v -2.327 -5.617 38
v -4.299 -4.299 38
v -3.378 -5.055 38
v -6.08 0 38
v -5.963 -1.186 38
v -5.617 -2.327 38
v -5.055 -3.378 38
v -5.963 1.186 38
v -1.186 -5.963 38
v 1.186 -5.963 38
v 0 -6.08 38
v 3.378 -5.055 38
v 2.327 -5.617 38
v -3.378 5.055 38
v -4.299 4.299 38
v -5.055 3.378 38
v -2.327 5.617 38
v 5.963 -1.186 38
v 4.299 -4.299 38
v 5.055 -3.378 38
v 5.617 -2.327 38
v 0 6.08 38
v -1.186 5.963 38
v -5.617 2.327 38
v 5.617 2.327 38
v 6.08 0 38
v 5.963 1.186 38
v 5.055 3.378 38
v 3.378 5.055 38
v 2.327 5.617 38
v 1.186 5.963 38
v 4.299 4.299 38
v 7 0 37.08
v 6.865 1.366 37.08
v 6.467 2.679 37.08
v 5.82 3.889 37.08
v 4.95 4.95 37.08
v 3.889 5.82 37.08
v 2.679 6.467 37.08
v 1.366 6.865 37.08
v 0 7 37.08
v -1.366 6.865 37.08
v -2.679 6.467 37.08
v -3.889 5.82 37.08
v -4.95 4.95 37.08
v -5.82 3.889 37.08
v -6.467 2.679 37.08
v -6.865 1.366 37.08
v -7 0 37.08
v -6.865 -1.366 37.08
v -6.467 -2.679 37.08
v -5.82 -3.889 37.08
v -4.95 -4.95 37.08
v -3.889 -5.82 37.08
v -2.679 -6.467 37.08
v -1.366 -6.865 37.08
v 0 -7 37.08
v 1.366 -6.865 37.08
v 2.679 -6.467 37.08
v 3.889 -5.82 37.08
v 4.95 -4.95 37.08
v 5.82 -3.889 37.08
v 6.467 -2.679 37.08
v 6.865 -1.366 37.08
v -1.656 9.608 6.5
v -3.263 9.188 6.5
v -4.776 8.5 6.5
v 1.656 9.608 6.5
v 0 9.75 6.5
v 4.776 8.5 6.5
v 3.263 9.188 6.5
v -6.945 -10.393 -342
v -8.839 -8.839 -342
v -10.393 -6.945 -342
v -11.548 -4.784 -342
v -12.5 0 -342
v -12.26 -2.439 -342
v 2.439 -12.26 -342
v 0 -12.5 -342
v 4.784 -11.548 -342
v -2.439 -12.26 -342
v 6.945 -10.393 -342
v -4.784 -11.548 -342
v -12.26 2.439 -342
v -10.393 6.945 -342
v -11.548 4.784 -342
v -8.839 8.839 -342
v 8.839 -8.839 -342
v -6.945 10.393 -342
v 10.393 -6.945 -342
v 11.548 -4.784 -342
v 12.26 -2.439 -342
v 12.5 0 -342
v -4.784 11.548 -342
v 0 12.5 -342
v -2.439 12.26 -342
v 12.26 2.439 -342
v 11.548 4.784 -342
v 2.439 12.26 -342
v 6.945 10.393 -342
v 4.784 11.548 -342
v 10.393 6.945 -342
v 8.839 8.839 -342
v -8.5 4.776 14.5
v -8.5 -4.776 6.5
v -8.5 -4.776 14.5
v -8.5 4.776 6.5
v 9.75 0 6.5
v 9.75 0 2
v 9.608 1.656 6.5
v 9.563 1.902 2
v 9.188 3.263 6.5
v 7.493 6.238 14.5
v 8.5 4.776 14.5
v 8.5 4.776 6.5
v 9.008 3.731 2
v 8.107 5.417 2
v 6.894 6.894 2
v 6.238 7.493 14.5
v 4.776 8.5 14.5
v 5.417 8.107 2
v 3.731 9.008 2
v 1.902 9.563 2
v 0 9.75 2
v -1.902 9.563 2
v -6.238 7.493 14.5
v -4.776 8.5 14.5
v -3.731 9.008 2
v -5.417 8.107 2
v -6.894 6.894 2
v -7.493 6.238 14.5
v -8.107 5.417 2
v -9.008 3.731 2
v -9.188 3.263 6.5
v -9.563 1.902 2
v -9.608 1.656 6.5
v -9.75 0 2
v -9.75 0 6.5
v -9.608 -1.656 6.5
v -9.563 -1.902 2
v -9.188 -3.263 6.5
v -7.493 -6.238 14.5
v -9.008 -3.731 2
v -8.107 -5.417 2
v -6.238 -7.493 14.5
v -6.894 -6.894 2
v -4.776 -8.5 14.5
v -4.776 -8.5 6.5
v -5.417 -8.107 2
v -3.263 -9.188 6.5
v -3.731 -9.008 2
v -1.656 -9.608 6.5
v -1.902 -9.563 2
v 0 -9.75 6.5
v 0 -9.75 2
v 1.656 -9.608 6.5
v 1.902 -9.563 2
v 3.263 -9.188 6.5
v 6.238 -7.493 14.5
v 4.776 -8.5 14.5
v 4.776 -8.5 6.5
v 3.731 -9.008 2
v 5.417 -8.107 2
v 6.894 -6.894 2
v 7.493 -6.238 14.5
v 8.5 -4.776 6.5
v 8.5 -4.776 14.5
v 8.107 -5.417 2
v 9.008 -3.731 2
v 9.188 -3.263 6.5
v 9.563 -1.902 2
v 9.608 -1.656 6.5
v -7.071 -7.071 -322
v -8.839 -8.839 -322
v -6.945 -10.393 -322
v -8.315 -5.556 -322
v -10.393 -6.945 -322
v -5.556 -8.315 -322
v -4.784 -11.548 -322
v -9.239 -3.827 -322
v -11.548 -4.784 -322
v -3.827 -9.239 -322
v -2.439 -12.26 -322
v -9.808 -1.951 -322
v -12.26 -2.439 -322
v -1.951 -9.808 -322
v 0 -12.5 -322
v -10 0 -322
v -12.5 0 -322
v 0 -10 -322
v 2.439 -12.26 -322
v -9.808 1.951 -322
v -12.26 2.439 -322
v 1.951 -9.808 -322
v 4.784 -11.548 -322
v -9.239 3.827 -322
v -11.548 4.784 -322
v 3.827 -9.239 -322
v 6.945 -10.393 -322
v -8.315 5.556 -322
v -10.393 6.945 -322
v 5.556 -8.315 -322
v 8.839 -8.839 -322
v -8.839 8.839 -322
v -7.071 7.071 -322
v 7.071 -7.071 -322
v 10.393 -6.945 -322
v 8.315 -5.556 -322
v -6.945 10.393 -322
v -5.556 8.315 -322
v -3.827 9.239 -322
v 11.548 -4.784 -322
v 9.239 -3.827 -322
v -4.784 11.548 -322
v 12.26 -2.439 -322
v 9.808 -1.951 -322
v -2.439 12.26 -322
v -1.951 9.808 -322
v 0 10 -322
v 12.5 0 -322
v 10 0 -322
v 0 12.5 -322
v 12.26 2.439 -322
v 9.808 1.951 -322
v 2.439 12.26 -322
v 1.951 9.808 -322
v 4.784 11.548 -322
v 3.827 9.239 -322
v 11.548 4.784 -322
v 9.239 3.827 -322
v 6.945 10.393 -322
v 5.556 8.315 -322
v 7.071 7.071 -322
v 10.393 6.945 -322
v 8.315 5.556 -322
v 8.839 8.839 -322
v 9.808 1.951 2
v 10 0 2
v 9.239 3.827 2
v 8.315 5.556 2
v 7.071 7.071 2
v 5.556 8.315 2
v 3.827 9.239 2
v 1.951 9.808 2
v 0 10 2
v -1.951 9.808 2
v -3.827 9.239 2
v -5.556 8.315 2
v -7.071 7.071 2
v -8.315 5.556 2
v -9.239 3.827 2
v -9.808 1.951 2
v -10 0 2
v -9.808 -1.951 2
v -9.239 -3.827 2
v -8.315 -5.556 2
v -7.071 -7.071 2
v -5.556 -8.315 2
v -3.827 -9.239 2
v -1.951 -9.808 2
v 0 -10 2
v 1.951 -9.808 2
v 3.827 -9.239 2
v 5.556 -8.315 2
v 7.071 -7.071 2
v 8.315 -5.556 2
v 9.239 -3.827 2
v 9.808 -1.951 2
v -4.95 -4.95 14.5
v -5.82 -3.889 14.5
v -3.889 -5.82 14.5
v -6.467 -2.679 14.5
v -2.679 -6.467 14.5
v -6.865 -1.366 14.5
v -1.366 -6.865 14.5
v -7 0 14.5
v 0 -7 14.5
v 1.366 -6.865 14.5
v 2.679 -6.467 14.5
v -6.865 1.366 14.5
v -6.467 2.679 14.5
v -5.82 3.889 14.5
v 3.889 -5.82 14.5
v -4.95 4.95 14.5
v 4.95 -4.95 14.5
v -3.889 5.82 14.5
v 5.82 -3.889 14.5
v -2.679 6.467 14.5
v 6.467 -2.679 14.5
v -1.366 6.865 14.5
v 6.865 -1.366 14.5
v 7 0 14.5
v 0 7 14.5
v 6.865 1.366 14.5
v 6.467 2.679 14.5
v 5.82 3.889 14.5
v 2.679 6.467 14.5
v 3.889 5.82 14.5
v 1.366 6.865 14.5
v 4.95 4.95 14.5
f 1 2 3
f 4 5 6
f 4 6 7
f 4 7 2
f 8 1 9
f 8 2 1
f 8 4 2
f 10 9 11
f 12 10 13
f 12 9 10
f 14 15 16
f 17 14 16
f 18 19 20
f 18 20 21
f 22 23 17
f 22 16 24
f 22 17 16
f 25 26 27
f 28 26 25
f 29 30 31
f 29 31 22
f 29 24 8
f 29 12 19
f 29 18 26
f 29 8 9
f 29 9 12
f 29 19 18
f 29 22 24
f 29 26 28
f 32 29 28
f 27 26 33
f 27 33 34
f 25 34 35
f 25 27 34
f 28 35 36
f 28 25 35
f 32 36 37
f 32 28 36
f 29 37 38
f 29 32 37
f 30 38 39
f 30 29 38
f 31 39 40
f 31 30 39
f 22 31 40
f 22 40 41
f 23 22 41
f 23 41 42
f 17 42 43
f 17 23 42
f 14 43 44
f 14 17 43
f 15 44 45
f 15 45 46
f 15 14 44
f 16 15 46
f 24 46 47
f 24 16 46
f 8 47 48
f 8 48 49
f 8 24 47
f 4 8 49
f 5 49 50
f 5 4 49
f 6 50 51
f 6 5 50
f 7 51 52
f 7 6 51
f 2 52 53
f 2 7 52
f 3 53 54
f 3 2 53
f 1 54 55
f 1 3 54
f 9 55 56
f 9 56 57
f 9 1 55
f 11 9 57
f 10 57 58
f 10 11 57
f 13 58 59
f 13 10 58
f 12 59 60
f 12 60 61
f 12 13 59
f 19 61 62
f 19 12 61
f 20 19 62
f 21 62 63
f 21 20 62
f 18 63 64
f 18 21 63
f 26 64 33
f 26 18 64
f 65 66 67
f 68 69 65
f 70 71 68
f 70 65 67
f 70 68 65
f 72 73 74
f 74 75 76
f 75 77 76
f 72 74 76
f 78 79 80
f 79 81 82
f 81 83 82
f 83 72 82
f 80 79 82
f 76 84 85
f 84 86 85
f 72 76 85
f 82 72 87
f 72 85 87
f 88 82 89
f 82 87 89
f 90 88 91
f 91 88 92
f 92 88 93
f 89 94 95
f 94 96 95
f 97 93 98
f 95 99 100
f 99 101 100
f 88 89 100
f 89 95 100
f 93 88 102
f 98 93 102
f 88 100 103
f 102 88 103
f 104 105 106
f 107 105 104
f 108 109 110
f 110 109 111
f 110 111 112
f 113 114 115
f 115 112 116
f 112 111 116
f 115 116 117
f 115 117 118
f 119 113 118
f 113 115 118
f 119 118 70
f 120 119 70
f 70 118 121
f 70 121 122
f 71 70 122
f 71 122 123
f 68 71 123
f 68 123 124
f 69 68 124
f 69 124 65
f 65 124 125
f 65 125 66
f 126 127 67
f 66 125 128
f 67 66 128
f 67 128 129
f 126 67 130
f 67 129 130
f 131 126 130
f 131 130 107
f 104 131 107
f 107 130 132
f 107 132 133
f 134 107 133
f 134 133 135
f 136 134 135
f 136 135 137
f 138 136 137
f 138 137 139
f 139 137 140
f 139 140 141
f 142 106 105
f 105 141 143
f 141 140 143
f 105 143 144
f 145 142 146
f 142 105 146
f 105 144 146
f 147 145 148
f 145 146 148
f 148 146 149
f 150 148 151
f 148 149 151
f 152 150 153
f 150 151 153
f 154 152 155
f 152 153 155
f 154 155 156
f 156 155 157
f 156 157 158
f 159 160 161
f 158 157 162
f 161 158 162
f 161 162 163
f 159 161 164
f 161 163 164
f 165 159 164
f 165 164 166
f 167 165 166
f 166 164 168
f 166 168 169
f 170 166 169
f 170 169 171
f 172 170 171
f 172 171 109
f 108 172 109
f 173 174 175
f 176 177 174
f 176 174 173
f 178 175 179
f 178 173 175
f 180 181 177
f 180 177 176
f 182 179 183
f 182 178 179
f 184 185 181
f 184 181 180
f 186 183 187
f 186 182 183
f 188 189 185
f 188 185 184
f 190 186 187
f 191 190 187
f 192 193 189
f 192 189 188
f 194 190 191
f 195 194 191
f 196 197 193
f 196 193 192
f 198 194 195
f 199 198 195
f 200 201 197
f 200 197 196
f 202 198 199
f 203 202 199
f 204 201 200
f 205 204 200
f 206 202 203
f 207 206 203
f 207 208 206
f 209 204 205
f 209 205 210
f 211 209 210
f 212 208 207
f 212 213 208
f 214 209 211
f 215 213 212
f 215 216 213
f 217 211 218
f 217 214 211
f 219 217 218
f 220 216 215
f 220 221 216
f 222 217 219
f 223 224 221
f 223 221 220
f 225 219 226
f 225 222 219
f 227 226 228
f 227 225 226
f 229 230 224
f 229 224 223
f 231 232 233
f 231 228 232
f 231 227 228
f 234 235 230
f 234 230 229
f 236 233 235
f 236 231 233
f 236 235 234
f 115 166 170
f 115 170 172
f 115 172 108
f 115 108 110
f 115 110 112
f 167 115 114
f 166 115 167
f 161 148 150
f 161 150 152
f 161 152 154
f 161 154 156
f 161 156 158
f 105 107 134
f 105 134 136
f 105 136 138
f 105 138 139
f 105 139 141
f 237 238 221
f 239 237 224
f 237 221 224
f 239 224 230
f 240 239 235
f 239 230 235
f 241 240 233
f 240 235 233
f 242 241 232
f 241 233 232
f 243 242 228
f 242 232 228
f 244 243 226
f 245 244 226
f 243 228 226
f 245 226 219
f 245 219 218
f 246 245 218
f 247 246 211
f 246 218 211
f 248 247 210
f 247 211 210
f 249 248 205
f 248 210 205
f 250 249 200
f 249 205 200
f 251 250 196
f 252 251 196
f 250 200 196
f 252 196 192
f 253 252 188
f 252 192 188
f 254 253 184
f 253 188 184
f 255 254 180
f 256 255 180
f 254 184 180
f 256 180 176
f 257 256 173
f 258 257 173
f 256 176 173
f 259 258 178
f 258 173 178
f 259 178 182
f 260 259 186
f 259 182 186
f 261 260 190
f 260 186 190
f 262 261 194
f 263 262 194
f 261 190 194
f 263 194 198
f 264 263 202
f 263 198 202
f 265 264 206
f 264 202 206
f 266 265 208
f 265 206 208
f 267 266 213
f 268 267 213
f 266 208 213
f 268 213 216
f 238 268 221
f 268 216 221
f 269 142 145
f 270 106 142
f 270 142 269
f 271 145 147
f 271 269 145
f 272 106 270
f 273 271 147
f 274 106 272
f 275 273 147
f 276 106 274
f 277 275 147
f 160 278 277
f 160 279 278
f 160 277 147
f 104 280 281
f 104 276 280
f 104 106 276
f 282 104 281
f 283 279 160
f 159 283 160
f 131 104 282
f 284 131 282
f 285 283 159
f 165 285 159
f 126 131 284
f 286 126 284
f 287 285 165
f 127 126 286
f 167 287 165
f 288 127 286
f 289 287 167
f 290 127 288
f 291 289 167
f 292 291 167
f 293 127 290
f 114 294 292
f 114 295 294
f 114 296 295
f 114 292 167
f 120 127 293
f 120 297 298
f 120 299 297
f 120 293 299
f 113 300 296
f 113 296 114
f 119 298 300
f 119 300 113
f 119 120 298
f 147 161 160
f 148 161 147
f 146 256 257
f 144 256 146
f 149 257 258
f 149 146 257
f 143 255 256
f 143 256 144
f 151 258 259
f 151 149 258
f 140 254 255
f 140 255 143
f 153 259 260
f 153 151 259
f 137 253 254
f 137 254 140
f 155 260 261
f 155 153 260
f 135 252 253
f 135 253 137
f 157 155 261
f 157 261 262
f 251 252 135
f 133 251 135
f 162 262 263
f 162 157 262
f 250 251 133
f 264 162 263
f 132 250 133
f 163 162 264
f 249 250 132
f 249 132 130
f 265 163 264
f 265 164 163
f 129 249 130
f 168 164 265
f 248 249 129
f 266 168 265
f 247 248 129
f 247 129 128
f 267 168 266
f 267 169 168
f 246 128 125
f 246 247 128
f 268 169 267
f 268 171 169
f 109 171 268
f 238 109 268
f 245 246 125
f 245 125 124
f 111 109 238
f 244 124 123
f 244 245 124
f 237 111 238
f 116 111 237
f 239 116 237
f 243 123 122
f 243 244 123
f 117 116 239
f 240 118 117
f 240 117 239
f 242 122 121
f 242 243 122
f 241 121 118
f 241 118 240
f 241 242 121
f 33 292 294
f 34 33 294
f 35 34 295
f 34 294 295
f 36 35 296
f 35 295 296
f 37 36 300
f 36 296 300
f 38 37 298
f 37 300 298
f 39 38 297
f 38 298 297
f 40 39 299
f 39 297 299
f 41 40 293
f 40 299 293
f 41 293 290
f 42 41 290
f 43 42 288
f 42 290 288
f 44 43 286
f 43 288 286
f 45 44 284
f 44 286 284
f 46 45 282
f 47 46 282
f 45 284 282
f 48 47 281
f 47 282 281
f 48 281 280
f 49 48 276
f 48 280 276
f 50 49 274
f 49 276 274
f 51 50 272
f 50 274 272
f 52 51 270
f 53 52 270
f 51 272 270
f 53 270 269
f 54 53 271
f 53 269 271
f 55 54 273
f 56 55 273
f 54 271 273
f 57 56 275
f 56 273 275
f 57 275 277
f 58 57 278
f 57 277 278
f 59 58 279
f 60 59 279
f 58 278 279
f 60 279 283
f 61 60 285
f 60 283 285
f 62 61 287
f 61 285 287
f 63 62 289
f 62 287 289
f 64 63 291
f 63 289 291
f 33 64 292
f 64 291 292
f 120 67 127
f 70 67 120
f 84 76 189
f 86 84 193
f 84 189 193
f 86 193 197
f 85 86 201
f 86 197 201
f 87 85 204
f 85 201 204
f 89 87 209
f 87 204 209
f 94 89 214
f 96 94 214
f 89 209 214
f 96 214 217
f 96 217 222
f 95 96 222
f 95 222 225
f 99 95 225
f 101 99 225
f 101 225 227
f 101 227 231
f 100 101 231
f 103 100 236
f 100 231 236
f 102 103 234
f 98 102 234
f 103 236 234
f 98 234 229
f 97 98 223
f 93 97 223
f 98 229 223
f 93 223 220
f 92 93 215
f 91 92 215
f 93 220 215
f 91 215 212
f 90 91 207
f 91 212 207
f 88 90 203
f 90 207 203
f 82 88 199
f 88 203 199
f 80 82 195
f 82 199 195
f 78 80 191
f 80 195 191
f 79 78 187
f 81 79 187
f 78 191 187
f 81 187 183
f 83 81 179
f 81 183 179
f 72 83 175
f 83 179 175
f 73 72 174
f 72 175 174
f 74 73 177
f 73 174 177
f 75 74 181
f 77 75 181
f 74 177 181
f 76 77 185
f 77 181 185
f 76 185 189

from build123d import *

# Parameters (mm, degrees)
SKETCH1_W           = 12.5
SKETCH1_H           = 20
SKETCH2_R           = 10
BOSS_EXTRUDE1_DEPTH = 324
SKETCH3_R           = 9.75
BOSS_EXTRUDE2_DEPTH = 12.5
CUT_EXTRUDE1_START  = -8
CUT_EXTRUDE1_DEPTH  = 8
CUT_EXTRUDE2_START  = -8
CUT_EXTRUDE2_DEPTH  = 8
CUT_EXTRUDE3_START  = -8
CUT_EXTRUDE3_DEPTH  = 8
CUT_EXTRUDE4_START  = -8
CUT_EXTRUDE4_DEPTH  = 8
SKETCH8_R           = 7
BOSS_EXTRUDE3_DEPTH = 23.5
CHAMFER1_SIZE       = 0.92


with BuildPart() as part:
    # Sketch1 → Revolve1 (revolve)
    with BuildSketch(Plane.XZ, mode=Mode.PRIVATE) as revolve1_sk:
        with Locations((6.25, -332)):
            Rectangle(SKETCH1_W, SKETCH1_H)
    revolve(revolve1_sk.sketch.rotate(Axis((0, 0, -322), (0, 0, -1)), 180), axis=Axis((0, 0, -322), (0, 0, -1)))

    # Sketch2 → Boss-Extrude1 (add)
    with BuildSketch(Plane.XY.offset(-322)):
        Circle(SKETCH2_R)
    extrude(amount=BOSS_EXTRUDE1_DEPTH)

    # Sketch3 → Boss-Extrude2 (add)
    with BuildSketch(Plane.XY.offset(2)):
        Circle(SKETCH3_R)
    extrude(amount=BOSS_EXTRUDE2_DEPTH)

    # Sketch4 → Cut-Extrude1 (cut)
    with BuildSketch(Plane.XY.offset(14.5).offset(CUT_EXTRUDE1_START)):
        with BuildLine():
            Line((-8.5, -4.776243294), (-8.5, 4.776243294))
            ThreePointArc((-8.5, 4.776243294), (-9.75, 0), (-8.5, -4.776243294))
        make_face()
    extrude(amount=CUT_EXTRUDE1_DEPTH, mode=Mode.SUBTRACT)

    # Sketch5 → Cut-Extrude2 (cut)
    with BuildSketch(Plane.XY.offset(14.5).offset(CUT_EXTRUDE2_START)):
        with BuildLine():
            Line((4.776243294, -8.5), (-4.776243294, -8.5))
            ThreePointArc((-4.776243294, -8.5), (0, -9.75), (4.776243294, -8.5))
        make_face()
    extrude(amount=CUT_EXTRUDE2_DEPTH, mode=Mode.SUBTRACT)

    # Sketch6 → Cut-Extrude3 (cut)
    with BuildSketch(Plane.XY.offset(14.5).offset(CUT_EXTRUDE3_START)):
        with BuildLine():
            Line((8.5, 4.776243294), (8.5, -4.776243294))
            ThreePointArc((8.5, -4.776243294), (9.75, 0), (8.5, 4.776243294))
        make_face()
    extrude(amount=CUT_EXTRUDE3_DEPTH, mode=Mode.SUBTRACT)

    # Sketch7 → Cut-Extrude4 (cut)
    with BuildSketch(Plane.XY.offset(14.5).offset(CUT_EXTRUDE4_START)):
        with BuildLine():
            Line((-4.776243294, 8.5), (4.776243294, 8.5))
            ThreePointArc((4.776243294, 8.5), (0, 9.75), (-4.776243294, 8.5))
        make_face()
    extrude(amount=CUT_EXTRUDE4_DEPTH, mode=Mode.SUBTRACT)

    # Sketch8 → Boss-Extrude3 (add)
    with BuildSketch(Plane.XY.offset(14.5)):
        Circle(SKETCH8_R)
    extrude(amount=BOSS_EXTRUDE3_DEPTH)

    # Chamfer1
    chamfer1_edges = [part.edges().sort_by_distance(p)[0] for p in [
        (-7, 0, 38),
    ]]
    chamfer(chamfer1_edges, length=CHAMFER1_SIZE)


solid = part.part
